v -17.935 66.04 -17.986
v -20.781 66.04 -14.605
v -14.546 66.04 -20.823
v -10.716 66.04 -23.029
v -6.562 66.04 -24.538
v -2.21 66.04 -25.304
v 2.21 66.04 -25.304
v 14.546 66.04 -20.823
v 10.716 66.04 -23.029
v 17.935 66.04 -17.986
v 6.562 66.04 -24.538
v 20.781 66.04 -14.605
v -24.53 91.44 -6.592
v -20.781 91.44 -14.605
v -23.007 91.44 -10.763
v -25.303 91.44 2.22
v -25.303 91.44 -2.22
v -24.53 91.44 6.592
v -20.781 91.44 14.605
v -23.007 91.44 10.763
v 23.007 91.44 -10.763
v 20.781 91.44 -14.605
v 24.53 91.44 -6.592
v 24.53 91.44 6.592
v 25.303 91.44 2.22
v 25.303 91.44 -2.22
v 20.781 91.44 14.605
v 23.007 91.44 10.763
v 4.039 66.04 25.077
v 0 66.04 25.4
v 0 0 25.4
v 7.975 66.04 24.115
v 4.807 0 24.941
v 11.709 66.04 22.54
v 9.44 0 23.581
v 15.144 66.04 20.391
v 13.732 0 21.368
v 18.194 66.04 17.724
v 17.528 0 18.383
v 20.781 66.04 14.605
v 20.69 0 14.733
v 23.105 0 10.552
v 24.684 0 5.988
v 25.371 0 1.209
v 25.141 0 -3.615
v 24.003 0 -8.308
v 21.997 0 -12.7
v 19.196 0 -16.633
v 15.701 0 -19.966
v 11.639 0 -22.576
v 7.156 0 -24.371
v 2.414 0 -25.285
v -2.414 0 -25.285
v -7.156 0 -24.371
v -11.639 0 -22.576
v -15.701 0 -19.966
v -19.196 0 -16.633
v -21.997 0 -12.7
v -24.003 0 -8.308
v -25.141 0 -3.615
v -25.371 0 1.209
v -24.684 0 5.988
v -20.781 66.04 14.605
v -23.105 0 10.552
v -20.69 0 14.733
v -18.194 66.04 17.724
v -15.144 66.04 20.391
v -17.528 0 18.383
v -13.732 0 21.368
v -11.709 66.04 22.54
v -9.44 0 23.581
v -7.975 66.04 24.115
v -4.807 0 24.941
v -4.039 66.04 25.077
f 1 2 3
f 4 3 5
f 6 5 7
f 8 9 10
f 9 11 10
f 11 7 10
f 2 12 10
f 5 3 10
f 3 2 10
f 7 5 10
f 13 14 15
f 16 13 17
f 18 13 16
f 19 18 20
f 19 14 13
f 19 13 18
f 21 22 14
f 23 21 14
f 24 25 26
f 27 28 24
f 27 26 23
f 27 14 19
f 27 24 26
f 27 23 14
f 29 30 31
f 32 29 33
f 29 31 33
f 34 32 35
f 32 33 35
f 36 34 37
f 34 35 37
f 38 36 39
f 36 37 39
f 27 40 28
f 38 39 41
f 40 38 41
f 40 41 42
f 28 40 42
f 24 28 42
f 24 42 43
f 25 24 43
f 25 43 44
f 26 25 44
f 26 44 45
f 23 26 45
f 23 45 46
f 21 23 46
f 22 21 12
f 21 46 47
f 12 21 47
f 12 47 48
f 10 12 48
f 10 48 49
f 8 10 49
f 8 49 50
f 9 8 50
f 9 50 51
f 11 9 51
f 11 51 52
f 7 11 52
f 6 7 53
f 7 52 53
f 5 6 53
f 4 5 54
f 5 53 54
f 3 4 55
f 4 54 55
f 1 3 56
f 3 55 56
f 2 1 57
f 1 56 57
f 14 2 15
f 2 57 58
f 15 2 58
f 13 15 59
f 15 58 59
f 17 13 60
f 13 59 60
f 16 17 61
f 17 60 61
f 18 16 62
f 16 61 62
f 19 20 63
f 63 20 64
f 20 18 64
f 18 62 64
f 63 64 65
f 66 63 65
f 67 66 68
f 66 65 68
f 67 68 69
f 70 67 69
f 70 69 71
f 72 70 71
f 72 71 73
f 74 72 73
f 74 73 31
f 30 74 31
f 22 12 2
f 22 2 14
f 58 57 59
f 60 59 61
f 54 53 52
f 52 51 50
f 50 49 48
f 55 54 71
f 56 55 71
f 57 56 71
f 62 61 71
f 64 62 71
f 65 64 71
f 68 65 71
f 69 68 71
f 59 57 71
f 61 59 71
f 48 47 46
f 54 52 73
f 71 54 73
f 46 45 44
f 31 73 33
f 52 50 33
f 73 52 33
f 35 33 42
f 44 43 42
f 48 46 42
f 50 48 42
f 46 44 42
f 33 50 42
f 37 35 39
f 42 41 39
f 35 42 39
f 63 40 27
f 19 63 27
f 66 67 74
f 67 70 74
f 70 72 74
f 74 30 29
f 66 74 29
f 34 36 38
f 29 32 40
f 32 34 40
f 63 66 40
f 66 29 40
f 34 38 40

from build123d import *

# Parameters (mm, degrees)
SKETCH1_R           = 25.4
BOSS_EXTRUDE1_DEPTH = 91.44
CUT_EXTRUDE1_REACH  = 109.643
SKETCH2_W           = 10.795
SKETCH2_H           = 25.4


with BuildPart() as part:
    # Sketch1 → Boss-Extrude1 (new body)
    with BuildSketch(Plane(origin=(0, 0, 0), x_dir=(1, 0, 0), z_dir=(0, 1, 0))):
        with Locations(Location((0, 0, 0), (0, 0, 270))):
            Circle(SKETCH1_R)
    extrude(amount=BOSS_EXTRUDE1_DEPTH)

    # Sketch2 → Cut-Extrude1 (cut, up to next)
    with BuildSketch(Plane(origin=(25.4, 0, 0), x_dir=(0, 0, -1), z_dir=(1, 0, 0)), mode=Mode.PRIVATE) as cut_extrude1_sk1:
        with Locations((-20.0025, 78.74)):
            Rectangle(SKETCH2_W, SKETCH2_H)
    cut_extrude1_tool1 = extrude(cut_extrude1_sk1.sketch, amount=-CUT_EXTRUDE1_REACH, mode=Mode.PRIVATE) & part.part
    # Sketch2 → Cut-Extrude1 (cut, up to next)
    with BuildSketch(Plane(origin=(25.4, 0, 0), x_dir=(0, 0, -1), z_dir=(1, 0, 0)), mode=Mode.PRIVATE) as cut_extrude1_sk2:
        with Locations((20.0025, 78.74)):
            Rectangle(SKETCH2_W, SKETCH2_H)
    cut_extrude1_tool2 = extrude(cut_extrude1_sk2.sketch, amount=-CUT_EXTRUDE1_REACH, mode=Mode.PRIVATE) & part.part
    add(cut_extrude1_tool1.solids().sort_by_distance((25.4, 78.74, 20.0025))[0], mode=Mode.SUBTRACT)
    add(cut_extrude1_tool2.solids().sort_by_distance((25.4, 78.74, -20.0025))[0], mode=Mode.SUBTRACT)


solid = part.part
